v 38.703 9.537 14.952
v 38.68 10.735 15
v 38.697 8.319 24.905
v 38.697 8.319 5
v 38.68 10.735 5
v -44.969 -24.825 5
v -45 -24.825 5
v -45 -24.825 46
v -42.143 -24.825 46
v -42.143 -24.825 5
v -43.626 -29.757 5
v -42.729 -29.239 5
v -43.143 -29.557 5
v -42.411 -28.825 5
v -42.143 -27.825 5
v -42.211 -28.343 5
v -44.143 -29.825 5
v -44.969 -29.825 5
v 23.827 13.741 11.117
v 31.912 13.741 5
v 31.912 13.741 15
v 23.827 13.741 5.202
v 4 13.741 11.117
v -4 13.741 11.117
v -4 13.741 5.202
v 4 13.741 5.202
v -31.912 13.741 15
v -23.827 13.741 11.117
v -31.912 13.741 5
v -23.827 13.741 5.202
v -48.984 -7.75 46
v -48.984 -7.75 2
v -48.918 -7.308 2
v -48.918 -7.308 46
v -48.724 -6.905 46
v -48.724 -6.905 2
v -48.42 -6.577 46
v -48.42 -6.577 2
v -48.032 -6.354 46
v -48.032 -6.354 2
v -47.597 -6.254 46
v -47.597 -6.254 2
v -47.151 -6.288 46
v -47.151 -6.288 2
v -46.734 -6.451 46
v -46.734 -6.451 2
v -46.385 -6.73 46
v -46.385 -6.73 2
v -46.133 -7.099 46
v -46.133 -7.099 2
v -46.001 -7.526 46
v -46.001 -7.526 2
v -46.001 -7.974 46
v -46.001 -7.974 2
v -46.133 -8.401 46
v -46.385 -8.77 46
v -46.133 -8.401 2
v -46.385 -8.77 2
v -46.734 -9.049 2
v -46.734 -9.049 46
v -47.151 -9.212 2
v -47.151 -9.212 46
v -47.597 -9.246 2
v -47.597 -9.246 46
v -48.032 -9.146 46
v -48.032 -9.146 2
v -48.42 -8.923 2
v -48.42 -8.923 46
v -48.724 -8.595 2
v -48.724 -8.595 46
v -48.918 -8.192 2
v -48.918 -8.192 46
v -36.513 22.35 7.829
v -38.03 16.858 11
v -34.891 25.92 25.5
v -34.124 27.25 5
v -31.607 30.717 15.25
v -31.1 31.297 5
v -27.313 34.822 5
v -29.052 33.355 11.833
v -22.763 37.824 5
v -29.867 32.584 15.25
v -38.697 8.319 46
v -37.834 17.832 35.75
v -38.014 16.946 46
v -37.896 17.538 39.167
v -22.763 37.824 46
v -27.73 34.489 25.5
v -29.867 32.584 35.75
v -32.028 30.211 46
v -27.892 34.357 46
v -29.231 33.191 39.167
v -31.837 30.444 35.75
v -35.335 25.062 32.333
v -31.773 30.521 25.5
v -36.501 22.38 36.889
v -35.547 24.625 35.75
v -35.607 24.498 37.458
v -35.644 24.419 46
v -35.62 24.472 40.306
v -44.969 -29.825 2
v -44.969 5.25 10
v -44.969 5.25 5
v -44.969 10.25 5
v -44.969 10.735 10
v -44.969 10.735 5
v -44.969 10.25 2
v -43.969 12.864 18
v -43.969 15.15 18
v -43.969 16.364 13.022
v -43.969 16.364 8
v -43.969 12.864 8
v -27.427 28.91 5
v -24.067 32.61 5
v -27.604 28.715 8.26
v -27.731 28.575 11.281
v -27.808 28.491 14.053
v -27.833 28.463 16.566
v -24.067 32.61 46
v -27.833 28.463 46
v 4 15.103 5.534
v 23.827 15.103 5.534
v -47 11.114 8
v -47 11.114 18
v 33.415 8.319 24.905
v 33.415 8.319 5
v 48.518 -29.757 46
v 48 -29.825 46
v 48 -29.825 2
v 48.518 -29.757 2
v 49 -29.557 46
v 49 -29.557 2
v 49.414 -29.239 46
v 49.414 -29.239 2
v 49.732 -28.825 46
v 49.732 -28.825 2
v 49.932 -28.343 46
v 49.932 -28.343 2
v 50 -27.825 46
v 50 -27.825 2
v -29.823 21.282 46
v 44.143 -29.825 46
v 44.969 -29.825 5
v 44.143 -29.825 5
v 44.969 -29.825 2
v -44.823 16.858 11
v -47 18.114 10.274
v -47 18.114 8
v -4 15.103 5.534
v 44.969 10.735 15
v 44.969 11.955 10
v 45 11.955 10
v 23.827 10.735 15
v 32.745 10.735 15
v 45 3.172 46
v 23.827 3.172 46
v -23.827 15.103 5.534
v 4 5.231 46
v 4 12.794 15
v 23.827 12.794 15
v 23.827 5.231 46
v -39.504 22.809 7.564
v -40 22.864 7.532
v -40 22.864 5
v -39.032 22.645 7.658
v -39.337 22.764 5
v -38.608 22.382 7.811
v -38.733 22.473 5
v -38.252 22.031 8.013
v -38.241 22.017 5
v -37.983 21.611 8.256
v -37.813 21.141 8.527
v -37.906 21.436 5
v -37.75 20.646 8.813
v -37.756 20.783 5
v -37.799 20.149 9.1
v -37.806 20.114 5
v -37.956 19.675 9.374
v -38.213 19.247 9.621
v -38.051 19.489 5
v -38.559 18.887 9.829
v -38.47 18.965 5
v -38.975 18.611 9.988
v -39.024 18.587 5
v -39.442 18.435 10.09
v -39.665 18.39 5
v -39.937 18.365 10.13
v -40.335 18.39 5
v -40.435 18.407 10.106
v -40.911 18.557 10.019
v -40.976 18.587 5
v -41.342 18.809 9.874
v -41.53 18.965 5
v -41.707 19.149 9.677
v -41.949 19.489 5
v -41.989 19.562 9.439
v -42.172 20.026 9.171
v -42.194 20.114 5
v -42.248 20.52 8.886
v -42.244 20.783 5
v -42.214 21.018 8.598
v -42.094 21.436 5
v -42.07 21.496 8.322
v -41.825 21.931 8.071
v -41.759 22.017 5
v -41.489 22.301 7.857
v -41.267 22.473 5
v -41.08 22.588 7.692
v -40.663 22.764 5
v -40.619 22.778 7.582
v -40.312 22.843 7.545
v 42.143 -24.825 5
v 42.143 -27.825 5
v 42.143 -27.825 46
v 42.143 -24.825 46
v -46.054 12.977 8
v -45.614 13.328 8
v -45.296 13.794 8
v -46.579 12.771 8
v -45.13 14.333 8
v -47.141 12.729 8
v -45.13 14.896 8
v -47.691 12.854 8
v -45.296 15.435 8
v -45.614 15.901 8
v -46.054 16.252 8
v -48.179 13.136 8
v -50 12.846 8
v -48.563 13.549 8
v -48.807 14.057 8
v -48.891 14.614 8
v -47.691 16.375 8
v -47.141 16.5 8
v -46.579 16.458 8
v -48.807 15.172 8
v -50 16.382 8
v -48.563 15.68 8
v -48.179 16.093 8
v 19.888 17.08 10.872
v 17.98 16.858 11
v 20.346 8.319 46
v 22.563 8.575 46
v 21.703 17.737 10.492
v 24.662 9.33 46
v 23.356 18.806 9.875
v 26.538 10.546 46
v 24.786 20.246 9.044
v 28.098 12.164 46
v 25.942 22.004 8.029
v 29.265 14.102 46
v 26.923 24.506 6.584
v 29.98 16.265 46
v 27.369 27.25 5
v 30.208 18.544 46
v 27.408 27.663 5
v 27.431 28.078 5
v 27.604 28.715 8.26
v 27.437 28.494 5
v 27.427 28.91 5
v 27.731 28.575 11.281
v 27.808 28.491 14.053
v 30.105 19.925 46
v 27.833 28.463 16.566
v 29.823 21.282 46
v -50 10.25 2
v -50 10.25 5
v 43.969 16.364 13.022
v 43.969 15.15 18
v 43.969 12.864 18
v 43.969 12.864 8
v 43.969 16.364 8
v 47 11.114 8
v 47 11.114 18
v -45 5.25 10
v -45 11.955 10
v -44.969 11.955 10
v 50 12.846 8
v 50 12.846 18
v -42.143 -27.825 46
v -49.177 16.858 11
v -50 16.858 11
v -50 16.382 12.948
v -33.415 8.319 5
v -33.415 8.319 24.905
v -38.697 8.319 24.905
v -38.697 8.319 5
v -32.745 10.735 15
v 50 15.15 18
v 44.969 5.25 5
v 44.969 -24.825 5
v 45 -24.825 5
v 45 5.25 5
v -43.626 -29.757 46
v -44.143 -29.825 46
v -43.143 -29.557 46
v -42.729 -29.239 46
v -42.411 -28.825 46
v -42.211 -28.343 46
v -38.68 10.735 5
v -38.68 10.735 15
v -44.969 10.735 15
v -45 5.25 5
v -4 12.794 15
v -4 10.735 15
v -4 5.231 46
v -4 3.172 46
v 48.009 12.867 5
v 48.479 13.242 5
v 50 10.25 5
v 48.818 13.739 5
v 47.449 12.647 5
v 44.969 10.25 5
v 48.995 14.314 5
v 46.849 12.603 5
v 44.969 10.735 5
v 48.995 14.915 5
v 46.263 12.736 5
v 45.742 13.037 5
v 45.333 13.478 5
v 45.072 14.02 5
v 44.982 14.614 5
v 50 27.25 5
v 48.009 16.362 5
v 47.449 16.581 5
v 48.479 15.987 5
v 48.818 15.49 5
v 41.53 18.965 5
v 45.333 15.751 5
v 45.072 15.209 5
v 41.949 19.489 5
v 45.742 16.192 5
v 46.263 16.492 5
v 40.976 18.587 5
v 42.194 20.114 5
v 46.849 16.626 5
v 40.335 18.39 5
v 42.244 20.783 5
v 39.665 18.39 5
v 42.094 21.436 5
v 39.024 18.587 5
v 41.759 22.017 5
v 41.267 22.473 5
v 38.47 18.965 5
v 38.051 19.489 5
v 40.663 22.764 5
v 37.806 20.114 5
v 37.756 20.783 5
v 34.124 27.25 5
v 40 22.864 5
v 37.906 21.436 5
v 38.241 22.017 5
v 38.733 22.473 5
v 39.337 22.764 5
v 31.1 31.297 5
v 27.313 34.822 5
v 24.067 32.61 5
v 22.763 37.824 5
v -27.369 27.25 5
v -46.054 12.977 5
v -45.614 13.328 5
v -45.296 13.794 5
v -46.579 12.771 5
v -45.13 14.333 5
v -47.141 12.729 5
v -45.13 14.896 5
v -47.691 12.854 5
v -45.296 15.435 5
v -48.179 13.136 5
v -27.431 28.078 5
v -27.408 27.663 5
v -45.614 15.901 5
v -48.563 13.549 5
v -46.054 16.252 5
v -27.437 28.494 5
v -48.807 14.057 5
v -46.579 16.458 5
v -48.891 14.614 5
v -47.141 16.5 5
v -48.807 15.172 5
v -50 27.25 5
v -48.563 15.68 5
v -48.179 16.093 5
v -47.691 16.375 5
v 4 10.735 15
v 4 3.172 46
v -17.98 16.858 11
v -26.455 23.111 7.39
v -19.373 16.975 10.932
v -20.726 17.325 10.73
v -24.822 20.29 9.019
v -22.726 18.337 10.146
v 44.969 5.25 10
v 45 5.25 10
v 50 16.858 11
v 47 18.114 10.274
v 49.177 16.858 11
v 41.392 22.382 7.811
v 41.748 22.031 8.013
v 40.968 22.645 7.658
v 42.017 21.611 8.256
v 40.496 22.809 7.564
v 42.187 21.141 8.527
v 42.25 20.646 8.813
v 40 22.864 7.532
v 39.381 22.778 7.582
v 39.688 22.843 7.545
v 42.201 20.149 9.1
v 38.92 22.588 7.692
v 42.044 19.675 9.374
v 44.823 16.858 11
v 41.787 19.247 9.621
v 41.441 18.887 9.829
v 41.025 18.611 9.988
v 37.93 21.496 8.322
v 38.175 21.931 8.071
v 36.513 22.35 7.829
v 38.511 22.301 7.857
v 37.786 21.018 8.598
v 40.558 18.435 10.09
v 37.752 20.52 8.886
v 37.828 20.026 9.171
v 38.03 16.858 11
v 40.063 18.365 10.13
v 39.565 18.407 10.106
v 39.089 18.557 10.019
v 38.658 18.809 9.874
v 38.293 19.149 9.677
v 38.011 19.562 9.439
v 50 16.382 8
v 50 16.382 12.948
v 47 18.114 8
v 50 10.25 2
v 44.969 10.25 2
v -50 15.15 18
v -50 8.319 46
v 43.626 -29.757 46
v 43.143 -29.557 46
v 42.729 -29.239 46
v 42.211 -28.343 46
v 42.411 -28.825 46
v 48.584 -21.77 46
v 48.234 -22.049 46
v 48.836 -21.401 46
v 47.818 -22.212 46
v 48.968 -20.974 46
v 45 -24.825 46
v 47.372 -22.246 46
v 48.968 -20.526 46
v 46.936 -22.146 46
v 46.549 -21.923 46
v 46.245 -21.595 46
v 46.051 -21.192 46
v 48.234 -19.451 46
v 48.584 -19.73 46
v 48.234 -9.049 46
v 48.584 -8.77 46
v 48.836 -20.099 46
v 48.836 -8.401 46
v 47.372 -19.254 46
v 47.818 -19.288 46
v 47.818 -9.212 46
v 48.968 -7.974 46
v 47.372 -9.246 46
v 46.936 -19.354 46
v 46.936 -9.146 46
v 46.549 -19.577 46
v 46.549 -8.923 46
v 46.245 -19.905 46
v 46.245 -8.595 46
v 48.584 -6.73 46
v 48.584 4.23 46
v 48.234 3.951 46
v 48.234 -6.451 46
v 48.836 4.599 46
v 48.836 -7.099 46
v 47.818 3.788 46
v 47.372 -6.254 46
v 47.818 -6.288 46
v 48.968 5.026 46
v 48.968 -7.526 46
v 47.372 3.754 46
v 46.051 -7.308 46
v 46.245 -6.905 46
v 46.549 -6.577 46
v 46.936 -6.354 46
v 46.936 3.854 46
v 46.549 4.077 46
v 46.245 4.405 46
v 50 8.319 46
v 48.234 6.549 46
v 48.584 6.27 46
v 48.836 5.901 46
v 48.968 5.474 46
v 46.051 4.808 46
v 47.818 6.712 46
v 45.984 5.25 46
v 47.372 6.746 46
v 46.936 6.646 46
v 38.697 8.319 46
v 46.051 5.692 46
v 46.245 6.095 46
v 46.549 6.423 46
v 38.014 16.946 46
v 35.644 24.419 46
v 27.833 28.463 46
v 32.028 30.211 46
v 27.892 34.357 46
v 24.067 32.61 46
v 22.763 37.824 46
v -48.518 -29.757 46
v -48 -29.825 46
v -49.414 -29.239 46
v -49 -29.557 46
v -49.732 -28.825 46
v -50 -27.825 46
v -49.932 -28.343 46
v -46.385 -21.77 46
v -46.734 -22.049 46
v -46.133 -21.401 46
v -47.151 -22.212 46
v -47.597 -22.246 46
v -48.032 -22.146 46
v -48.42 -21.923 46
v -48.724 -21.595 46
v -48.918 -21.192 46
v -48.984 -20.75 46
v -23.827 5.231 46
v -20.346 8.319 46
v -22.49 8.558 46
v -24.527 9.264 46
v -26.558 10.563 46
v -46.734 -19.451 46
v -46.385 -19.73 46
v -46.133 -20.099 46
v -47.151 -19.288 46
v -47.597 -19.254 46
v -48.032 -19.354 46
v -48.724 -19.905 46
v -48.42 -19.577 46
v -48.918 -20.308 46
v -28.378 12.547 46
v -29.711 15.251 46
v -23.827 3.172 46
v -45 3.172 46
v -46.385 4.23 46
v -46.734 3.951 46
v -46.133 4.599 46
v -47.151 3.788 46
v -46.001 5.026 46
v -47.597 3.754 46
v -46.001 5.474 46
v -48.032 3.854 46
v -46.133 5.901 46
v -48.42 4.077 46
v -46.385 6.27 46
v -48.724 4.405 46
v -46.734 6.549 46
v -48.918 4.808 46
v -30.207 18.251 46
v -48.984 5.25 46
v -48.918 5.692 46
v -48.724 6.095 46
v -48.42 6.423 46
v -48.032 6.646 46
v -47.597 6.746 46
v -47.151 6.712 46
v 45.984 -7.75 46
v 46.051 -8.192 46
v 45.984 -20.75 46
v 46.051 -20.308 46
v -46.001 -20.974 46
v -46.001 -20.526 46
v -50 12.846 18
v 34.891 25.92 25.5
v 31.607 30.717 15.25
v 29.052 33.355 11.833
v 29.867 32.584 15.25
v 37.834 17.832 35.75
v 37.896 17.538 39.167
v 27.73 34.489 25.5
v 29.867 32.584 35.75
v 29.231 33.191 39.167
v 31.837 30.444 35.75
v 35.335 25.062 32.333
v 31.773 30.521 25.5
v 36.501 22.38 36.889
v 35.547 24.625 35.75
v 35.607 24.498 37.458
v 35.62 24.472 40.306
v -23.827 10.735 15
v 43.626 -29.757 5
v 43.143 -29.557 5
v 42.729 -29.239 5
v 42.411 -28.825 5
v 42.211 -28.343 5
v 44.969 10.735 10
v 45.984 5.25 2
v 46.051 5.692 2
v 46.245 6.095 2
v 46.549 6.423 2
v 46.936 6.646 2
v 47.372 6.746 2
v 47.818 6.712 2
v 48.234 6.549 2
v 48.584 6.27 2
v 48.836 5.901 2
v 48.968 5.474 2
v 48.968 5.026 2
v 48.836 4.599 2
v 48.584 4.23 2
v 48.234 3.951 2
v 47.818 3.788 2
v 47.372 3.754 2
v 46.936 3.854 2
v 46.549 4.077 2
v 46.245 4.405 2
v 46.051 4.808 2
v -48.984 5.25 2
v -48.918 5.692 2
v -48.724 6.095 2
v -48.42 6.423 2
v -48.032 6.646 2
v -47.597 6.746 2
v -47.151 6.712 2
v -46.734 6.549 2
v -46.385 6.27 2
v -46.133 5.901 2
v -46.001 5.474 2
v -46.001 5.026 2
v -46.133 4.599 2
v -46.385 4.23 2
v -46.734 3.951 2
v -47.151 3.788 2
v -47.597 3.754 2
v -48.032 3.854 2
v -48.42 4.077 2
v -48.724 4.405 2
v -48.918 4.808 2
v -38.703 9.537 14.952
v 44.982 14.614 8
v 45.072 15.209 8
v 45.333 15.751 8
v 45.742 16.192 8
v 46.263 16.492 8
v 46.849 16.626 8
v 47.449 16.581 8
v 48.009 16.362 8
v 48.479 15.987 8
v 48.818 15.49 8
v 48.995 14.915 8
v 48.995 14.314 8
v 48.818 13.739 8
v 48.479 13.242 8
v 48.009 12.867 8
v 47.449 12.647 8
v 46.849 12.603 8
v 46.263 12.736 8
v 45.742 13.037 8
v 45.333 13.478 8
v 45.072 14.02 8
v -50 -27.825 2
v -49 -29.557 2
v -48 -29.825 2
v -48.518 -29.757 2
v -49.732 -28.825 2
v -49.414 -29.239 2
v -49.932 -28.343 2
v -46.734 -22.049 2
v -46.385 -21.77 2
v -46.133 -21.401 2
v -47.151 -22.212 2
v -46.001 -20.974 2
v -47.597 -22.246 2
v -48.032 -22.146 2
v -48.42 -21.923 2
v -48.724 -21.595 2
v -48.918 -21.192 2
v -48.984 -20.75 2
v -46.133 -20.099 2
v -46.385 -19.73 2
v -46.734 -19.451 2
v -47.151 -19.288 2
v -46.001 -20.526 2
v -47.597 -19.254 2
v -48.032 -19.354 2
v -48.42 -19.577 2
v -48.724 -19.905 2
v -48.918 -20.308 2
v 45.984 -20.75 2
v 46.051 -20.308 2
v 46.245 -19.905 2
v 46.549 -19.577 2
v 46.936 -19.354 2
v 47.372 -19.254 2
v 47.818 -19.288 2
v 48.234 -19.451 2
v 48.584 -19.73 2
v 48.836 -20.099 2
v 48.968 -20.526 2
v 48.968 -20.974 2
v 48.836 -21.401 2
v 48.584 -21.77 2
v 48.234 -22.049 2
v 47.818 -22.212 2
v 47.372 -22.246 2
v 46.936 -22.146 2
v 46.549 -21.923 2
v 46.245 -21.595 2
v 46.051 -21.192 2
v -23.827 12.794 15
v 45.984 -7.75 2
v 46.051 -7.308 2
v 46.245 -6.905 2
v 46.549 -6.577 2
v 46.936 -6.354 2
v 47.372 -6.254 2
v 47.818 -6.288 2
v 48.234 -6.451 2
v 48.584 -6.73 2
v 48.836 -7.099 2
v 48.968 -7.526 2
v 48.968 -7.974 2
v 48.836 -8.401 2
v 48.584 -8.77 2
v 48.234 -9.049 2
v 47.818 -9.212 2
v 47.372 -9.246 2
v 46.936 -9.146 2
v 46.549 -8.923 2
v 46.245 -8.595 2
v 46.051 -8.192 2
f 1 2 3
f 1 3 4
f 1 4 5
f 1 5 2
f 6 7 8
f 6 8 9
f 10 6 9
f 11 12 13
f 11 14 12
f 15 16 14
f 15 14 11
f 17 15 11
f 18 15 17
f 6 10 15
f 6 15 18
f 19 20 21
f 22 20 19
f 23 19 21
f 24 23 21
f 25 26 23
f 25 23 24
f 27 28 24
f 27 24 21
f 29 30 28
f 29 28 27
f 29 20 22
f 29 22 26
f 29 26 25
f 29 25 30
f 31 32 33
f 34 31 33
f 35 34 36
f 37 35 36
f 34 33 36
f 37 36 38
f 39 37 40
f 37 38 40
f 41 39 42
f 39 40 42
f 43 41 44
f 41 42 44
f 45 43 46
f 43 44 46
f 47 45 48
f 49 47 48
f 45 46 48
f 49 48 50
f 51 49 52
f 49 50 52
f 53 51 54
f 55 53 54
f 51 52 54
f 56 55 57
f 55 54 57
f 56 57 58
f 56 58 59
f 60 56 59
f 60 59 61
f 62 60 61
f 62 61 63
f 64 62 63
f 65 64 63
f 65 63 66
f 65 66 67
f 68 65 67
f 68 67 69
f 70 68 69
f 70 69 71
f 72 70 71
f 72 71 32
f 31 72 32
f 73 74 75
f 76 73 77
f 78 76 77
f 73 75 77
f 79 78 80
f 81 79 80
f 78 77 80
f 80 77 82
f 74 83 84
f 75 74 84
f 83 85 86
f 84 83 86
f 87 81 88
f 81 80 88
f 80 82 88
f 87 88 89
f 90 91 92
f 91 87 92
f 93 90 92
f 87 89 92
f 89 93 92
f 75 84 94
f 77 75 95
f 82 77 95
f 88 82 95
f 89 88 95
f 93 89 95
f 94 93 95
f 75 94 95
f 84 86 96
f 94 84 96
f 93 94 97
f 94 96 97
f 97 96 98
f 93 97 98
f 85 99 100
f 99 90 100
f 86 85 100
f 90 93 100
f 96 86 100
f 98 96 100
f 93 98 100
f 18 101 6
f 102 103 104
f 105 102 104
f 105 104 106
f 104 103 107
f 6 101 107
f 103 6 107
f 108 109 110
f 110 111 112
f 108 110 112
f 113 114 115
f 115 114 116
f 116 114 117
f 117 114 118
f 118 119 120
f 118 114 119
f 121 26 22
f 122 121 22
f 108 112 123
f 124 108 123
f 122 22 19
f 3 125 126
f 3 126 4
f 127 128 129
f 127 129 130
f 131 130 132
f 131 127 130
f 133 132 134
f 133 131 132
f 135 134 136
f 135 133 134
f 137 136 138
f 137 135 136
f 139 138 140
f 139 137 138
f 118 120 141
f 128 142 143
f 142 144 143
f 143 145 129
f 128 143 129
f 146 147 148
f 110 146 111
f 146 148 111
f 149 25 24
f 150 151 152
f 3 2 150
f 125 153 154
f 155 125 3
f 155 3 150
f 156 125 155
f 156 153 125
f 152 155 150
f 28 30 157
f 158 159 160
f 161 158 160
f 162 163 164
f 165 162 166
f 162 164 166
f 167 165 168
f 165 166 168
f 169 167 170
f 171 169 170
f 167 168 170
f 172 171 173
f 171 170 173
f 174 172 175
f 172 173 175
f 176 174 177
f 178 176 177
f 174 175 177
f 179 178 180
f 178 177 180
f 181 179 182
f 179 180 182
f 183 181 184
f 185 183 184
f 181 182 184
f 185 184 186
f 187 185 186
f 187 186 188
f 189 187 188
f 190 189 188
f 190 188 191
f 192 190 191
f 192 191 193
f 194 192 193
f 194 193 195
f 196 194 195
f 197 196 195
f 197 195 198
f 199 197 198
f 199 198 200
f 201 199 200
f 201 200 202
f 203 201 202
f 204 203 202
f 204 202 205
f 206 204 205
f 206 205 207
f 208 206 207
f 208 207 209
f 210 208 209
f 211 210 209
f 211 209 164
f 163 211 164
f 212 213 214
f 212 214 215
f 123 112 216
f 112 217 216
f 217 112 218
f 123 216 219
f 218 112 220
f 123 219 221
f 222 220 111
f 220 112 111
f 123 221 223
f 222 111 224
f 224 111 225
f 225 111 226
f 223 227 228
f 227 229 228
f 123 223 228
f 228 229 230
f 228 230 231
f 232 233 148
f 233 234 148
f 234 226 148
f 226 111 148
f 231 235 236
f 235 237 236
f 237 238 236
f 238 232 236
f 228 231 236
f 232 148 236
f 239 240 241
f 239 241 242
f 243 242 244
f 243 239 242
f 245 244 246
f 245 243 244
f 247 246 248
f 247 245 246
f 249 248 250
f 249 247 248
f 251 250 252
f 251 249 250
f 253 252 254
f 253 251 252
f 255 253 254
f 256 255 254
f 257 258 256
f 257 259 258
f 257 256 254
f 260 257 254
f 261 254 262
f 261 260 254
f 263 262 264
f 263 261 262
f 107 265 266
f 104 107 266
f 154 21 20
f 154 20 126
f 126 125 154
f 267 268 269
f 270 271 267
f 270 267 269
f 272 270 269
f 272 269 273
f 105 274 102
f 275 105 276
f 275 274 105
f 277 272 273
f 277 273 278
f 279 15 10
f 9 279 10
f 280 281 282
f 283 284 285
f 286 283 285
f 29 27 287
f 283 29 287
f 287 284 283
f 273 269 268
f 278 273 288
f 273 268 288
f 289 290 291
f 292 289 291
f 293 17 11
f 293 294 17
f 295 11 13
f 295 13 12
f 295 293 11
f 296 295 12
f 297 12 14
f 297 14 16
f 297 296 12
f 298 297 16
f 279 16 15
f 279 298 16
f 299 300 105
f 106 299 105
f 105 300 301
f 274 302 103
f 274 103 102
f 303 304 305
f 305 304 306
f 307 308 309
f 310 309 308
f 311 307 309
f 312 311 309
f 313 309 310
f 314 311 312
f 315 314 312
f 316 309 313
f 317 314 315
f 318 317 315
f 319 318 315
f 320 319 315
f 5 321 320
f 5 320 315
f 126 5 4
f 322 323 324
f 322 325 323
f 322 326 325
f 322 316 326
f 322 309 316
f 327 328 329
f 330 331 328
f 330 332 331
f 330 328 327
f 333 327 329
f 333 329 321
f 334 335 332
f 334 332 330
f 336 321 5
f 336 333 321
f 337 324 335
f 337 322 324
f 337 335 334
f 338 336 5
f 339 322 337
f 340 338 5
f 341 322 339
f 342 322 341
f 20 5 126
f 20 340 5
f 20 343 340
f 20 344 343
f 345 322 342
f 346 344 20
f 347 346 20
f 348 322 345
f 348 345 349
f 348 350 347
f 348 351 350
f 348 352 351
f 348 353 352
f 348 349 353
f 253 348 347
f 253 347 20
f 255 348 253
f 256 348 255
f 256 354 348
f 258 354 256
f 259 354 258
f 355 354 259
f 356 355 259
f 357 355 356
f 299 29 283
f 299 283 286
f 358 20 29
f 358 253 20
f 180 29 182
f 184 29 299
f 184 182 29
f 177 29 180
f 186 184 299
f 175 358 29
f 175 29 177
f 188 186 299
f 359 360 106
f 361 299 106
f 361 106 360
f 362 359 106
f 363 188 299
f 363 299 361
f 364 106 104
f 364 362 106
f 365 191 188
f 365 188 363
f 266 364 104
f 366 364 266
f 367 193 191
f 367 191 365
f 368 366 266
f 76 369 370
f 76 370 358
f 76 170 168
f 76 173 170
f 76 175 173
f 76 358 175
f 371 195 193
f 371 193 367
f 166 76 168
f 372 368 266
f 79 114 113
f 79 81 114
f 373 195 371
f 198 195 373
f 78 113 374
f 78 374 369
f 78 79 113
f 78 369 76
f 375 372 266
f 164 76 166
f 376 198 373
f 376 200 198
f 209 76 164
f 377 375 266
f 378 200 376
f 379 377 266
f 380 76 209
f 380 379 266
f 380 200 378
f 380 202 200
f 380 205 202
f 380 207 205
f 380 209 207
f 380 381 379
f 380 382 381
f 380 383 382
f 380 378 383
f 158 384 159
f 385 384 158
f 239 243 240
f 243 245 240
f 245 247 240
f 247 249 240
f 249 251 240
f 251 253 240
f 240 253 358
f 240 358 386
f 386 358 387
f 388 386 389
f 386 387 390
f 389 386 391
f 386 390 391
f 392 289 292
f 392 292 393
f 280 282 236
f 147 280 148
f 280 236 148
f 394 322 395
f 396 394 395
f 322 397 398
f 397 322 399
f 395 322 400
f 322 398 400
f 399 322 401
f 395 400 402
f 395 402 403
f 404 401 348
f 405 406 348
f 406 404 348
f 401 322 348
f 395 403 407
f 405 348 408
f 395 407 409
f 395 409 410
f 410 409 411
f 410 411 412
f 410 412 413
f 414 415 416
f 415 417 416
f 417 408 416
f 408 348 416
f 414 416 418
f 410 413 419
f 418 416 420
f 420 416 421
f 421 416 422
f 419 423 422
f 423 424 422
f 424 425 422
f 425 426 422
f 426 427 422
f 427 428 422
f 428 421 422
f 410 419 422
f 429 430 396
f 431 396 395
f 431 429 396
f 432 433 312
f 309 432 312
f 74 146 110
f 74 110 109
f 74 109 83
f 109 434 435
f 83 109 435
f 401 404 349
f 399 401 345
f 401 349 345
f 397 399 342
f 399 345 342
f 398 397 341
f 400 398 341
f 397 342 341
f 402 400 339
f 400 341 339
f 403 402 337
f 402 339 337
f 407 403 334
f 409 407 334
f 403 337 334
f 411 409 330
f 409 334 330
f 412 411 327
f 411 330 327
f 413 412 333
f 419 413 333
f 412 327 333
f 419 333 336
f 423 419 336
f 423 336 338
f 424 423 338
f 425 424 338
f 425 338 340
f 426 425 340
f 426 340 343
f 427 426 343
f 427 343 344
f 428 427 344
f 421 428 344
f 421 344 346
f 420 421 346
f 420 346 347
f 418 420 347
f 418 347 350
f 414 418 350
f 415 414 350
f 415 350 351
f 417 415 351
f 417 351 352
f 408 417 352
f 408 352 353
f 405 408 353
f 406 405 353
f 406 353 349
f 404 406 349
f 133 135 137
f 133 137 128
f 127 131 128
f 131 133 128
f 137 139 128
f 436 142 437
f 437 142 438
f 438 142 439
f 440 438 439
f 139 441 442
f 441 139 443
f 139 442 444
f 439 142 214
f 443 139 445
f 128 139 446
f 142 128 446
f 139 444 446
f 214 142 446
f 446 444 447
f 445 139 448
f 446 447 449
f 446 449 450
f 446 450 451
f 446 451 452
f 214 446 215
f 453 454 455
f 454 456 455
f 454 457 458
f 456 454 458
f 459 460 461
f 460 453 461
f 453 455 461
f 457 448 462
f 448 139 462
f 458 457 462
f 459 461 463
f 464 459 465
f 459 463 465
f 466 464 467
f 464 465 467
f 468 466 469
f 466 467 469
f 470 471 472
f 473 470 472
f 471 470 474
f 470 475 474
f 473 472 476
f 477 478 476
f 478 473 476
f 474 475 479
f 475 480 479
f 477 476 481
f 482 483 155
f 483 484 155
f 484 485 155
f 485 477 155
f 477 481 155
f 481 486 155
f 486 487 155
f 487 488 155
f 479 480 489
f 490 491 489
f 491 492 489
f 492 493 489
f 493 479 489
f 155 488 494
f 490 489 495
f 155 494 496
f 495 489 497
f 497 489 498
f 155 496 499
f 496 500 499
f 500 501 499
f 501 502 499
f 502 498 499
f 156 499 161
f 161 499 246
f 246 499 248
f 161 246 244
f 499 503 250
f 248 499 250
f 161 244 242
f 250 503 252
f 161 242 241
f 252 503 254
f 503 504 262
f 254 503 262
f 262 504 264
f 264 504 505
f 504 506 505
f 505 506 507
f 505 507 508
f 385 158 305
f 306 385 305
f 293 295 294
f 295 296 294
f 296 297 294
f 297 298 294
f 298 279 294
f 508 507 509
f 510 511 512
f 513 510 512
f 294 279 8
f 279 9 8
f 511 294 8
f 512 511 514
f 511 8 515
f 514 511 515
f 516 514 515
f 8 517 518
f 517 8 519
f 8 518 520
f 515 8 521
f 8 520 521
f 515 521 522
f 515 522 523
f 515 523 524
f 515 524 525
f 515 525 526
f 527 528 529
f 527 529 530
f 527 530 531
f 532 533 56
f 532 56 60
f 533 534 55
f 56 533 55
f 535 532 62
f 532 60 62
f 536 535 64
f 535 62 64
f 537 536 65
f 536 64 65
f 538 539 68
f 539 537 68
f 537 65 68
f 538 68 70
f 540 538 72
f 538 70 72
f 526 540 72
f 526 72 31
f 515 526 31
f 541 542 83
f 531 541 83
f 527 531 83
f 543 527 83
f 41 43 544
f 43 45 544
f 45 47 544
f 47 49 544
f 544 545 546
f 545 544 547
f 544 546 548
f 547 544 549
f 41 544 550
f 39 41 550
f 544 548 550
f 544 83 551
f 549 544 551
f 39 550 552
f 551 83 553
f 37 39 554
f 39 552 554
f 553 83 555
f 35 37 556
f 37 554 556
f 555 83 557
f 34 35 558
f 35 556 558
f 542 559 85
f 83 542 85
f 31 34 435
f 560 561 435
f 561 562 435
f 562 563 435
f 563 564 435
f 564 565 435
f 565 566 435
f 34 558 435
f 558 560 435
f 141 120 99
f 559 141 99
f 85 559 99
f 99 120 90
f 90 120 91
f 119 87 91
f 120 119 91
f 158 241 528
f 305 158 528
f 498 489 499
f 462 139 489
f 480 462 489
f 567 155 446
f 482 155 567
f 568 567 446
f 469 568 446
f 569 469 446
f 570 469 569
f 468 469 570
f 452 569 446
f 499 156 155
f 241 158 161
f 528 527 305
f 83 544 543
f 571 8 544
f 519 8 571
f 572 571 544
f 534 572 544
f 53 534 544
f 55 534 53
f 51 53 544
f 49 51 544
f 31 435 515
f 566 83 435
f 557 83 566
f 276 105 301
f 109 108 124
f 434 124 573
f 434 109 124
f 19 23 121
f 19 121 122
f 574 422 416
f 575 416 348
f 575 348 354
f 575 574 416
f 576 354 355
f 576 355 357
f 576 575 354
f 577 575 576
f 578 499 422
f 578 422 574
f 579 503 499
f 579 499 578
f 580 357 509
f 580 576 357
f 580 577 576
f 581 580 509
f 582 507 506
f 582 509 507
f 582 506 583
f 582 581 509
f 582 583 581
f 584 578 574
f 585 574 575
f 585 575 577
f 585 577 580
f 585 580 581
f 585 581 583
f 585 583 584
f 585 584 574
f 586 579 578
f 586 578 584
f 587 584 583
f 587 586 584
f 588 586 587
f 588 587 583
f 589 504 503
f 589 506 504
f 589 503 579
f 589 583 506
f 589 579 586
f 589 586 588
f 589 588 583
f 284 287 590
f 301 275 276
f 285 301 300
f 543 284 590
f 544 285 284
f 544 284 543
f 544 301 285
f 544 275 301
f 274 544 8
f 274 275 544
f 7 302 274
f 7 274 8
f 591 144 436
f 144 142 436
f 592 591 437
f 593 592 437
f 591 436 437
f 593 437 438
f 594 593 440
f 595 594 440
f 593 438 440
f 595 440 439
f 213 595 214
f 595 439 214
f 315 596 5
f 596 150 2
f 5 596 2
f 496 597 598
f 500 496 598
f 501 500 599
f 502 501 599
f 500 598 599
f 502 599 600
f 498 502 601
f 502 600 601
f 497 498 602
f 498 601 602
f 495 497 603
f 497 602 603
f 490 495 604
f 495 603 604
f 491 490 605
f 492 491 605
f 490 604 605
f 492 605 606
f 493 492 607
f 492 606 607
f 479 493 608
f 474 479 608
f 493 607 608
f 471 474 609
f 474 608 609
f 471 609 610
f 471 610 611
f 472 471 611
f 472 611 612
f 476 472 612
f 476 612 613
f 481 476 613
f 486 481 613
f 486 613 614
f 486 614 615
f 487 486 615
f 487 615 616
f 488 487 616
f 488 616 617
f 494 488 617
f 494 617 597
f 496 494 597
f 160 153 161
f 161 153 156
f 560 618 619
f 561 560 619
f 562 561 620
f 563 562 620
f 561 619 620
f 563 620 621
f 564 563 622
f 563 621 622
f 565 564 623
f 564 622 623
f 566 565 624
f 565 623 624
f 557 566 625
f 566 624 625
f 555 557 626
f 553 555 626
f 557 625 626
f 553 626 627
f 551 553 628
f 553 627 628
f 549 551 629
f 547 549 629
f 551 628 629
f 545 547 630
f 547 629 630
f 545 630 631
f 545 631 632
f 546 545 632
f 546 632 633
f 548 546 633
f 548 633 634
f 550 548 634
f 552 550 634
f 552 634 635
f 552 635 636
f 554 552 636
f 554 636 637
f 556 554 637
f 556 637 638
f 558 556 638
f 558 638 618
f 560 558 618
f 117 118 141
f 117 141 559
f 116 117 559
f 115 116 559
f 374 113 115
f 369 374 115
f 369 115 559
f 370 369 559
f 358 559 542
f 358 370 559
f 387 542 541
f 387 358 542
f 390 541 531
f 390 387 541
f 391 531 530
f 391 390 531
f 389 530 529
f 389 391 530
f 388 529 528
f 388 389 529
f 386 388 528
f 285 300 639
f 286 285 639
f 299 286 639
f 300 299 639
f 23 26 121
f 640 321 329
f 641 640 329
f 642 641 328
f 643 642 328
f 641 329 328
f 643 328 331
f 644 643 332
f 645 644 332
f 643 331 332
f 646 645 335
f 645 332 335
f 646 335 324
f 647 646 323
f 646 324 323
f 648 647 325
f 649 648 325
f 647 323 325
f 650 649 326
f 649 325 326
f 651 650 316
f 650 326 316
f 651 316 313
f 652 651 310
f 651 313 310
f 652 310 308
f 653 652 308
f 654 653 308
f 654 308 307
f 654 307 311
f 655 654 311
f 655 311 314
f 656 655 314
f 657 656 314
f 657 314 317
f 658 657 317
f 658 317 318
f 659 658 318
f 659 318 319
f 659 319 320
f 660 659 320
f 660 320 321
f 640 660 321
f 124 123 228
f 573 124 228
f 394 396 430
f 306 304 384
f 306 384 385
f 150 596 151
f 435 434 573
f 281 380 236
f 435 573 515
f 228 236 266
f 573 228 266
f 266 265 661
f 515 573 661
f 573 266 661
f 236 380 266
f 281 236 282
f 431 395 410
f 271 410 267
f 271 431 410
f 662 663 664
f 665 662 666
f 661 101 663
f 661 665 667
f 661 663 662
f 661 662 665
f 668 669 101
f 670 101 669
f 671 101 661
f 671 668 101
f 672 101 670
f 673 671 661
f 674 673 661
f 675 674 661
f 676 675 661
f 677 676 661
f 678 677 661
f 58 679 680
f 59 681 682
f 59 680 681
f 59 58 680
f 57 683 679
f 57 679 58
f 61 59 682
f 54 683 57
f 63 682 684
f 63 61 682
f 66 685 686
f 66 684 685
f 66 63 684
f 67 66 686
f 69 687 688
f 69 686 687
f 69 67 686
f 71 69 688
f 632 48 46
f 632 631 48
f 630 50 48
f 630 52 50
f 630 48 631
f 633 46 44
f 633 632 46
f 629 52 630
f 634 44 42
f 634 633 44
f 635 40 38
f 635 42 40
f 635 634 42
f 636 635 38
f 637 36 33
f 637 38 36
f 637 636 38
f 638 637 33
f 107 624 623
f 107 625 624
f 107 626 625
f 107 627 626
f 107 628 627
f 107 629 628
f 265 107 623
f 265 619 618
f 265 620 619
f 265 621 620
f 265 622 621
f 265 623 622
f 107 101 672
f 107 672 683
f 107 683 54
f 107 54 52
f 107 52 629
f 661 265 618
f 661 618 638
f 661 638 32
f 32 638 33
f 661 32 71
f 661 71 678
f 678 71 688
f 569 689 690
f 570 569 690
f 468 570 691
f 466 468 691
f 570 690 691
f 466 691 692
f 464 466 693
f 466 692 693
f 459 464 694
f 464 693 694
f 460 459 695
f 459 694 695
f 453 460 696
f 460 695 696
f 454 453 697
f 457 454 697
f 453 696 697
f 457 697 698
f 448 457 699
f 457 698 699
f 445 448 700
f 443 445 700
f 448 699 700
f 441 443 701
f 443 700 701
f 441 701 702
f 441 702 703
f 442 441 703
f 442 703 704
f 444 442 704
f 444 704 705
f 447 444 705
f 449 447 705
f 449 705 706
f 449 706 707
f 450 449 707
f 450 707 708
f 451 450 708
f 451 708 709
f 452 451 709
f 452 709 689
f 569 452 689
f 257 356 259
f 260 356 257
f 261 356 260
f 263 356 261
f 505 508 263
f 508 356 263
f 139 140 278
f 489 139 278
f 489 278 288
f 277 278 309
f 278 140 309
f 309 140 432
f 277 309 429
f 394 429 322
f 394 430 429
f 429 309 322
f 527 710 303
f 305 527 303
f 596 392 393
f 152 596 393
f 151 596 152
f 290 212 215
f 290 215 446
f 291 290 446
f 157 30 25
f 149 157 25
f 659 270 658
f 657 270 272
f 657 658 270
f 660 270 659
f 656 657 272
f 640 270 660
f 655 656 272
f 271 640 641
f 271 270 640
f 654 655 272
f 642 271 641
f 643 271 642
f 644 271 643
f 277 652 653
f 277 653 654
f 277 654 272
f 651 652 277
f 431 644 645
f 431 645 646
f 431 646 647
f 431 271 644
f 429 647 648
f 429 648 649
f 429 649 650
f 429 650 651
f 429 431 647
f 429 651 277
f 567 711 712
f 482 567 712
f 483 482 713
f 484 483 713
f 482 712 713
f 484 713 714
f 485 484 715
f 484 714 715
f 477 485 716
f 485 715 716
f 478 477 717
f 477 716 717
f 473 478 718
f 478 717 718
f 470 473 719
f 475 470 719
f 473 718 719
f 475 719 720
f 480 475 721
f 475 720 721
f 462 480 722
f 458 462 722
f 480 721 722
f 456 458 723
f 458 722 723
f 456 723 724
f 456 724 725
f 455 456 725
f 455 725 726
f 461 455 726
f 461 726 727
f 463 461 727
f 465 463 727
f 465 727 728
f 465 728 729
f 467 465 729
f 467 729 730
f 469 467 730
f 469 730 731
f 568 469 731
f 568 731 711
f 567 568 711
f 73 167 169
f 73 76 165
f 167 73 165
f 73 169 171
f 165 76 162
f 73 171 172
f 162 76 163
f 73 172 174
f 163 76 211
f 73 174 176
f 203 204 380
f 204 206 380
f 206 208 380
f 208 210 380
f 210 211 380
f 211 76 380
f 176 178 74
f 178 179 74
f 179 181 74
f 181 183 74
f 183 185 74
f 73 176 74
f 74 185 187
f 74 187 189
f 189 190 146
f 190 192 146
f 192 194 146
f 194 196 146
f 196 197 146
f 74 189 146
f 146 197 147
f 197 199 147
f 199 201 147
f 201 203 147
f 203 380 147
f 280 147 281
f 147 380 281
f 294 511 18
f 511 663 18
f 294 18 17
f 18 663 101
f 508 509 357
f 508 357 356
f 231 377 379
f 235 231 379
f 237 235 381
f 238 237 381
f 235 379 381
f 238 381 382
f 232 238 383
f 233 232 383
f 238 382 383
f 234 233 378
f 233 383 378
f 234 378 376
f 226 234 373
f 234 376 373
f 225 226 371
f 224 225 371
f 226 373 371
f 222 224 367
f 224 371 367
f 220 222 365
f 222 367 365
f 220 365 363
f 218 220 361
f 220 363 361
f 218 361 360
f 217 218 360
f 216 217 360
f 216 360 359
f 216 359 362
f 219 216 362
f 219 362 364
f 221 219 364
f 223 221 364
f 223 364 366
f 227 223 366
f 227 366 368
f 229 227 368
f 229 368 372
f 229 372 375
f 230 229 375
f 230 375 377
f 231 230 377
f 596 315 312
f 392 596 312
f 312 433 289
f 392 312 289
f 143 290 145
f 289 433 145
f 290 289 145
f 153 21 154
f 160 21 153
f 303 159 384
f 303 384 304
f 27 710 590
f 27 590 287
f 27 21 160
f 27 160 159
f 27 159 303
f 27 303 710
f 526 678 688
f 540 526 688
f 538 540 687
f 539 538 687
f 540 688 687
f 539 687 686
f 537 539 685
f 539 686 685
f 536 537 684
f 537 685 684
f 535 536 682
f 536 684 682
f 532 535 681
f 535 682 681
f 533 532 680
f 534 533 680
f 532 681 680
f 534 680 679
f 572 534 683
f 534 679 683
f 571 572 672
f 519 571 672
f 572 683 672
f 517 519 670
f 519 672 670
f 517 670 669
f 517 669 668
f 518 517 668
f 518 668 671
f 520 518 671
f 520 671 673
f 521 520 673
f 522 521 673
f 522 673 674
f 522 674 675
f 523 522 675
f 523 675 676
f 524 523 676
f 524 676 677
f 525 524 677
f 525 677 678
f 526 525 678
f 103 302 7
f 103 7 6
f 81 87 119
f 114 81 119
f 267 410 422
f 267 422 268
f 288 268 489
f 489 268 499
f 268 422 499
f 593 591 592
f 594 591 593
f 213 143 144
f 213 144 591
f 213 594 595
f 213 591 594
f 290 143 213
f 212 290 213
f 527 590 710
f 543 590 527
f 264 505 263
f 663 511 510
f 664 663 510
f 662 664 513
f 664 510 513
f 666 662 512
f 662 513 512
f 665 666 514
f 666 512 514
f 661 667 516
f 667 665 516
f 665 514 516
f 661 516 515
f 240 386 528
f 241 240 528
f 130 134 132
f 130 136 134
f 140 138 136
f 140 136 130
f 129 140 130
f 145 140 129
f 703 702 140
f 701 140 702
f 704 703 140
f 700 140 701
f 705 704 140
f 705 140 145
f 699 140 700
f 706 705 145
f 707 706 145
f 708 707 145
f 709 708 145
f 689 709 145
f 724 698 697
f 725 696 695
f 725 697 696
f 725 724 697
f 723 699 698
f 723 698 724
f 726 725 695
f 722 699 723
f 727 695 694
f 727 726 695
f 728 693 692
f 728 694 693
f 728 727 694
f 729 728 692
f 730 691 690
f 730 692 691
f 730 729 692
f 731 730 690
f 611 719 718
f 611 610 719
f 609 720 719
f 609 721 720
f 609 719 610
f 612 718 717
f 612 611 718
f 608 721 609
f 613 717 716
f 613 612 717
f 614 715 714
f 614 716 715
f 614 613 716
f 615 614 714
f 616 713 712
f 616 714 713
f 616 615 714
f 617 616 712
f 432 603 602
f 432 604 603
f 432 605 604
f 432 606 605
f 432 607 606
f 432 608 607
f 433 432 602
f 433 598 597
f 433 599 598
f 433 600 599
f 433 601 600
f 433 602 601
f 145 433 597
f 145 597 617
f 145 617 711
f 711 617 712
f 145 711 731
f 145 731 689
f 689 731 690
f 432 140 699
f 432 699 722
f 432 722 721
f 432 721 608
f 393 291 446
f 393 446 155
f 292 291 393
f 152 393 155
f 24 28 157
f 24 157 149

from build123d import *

# Parameters (mm, degrees)
SALIENTE_EXTRUIR1_DEPTH = 46
CROQUIS3_W              = 5
CROQUIS3_H              = 17
CORTAR_EXTRUIR1_DEPTH   = 107
VACIADO1_T              = -5
CORTAR_EXTRUIR3_DEPTH   = 5
CROQUIS8_W              = 84.286700134
CROQUIS8_H              = 59.012293191
CORTAR_EXTRUIR6_DEPTH   = 50
CROQUIS9_W              = 89.93795334
CROQUIS9_H              = 8.49113686
CORTAR_EXTRUIR7_DEPTH   = 10
REDONDEO1_R             = 2
REDONDEO2_R             = 2
REDONDEO3_R             = 2
CROQUIS10_W             = 19.827227688
CROQUIS10_H             = 42.140696998
CORTAR_EXTRUIR8_DEPTH   = 2
CROQUIS11_R             = 2.017504942
CROQUIS11_R_2           = 1.891140859
CORTAR_EXTRUIR9_DEPTH   = 9
CROQUIS12_R             = 2.25
CORTAR_EXTRUIR10_DEPTH  = 33
CORTAR_EXTRUIR11_START  = -3
CROQUIS13_R             = 2.075
CORTAR_EXTRUIR11_DEPTH  = 7
CROQUIS15_W             = 7.96749323
CROQUIS15_H             = 3.005999516
SALIENTE_EXTRUIR2_DEPTH = 10
CROQUIS16_R             = 1.5
CORTAR_EXTRUIR13_DEPTH  = 73
CROQUIS17_W             = 124.159046256
CROQUIS17_H             = 73.830112024
CORTAR_EXTRUIR14_DEPTH  = 2
CORTAR_EXTRUIR15_DEPTH  = 10
SALIENTE_EXTRUIR3_DEPTH = 41
REDONDEO4_R             = 10


with BuildPart() as part:
    # Croquis1 → Saliente-Extruir1 (new body)
    with BuildSketch(Plane.XY):
        Polygon((-50, -27.25), (-50, -29.825247619), (50, -29.825247619), (50, -27.25), (50, 27.25), (-50, 27.25), align=None)
    extrude(amount=SALIENTE_EXTRUIR1_DEPTH)

    # Croquis3 → Cortar-Extruir1 (cut)
    with BuildSketch(Plane.ZY.offset(50)):
        Polygon((46, 27.25), (5, 27.25), (11, 16.857695155), (46, 8.318575661), align=None)
        with Locations((2.5, 18.75)):
            Rectangle(CROQUIS3_W, CROQUIS3_H)
    extrude(amount=-CORTAR_EXTRUIR1_DEPTH, mode=Mode.SUBTRACT)

    # Vaciado1
    vaciado1_openings = [part.faces().sort_by_distance(p)[0] for p in [
        (0, -10.753335979, 46),
    ]]
    offset(amount=VACIADO1_T, openings=vaciado1_openings, kind=Kind.INTERSECTION)

    # Croquis5 → Cortar-Extruir3 (cut)
    with BuildSketch(Plane(origin=(0, 0, 0), x_dir=(-1, 0, 0), z_dir=(0, 0, -1))):
        Polygon((-44.96897667, 22.941518711), (-44.96897667, -22.941518711), (-44.96897667, -34.965963837), (44.96897667, -34.965963837), (44.96897667, -22.941518711), (44.96897667, 22.941518711), align=None)
    extrude(amount=-CORTAR_EXTRUIR3_DEPTH, mode=Mode.SUBTRACT)

    # Croquis8 → Cortar-Extruir6 (cut)
    with BuildSketch(Plane(origin=(0, 0, 2), x_dir=(-1, 0, 0), z_dir=(0, 0, -1))):
        with Locations((0, -42.853406707)):
            Rectangle(CROQUIS8_W, CROQUIS8_H)
    extrude(amount=-CORTAR_EXTRUIR6_DEPTH, mode=Mode.SUBTRACT)

    # Croquis9 → Cortar-Extruir7 (cut)
    with BuildSketch(Plane(origin=(0, 0, 5), x_dir=(-1, 0, 0), z_dir=(0, 0, -1))):
        with Locations((0, 9.49556843)):
            Rectangle(CROQUIS9_W, CROQUIS9_H)
    extrude(amount=-CORTAR_EXTRUIR7_DEPTH, mode=Mode.SUBTRACT)

    # Redondeo1
    redondeo1_edges = [part.edges().sort_by_distance(p)[0] for p in [
        (42.143350067, -29.825247619, 25.5),
        (-50, -29.825247619, 23),
    ]]
    fillet(redondeo1_edges, radius=REDONDEO1_R)

    # Redondeo2
    redondeo2_edges = [part.edges().sort_by_distance(p)[0] for p in [
        (50, -29.825247619, 23),
    ]]
    fillet(redondeo2_edges, radius=REDONDEO2_R)

    # Redondeo3
    redondeo3_edges = [part.edges().sort_by_distance(p)[0] for p in [
        (-42.143350067, -29.825247619, 25.5),
    ]]
    fillet(redondeo3_edges, radius=REDONDEO3_R)

    # Croquis10 → Cortar-Extruir8 (cut)
    with BuildSketch(Plane(origin=(0, 13.586066701, 3.314658486), x_dir=(1, 0, 0), z_dir=(0, -0.9715041436001179, -0.237022570587279))):
        with Locations((13.913613844, 22.867026133)):
            Rectangle(CROQUIS10_W, CROQUIS10_H)
        with Locations((-13.913613844, 22.867026133)):
            Rectangle(CROQUIS10_W, CROQUIS10_H)
    extrude(amount=-CORTAR_EXTRUIR8_DEPTH, mode=Mode.SUBTRACT)

    # Croquis11 → Cortar-Extruir9 (cut)
    with BuildSketch(Plane(origin=(0, 0, 0), x_dir=(-1, 0, 0), z_dir=(0, 0, -1))):
        with Locations((-47, 14.614370501)):
            Circle(CROQUIS11_R)
        with Locations((47, 14.614370501)):
            Circle(CROQUIS11_R_2)
    extrude(amount=-CORTAR_EXTRUIR9_DEPTH, mode=Mode.SUBTRACT)

    # Croquis12 → Cortar-Extruir10 (cut)
    with BuildSketch(Plane(origin=(0, 0, 0), x_dir=(-1, 0, 0), z_dir=(0, 0, -1))):
        with Locations((40, 20.614370501)):
            Circle(CROQUIS12_R)
        with Locations((-40, 20.614370501)):
            Circle(CROQUIS12_R)
    extrude(amount=-CORTAR_EXTRUIR10_DEPTH, mode=Mode.SUBTRACT)

    # Croquis13 → Cortar-Extruir11 (cut)
    with BuildSketch(Plane(origin=(0, 0, 5), x_dir=(-1, 0, 0), z_dir=(0, 0, -1)).offset(CORTAR_EXTRUIR11_START)):
        with Locations((47, 14.614370501)):
            Circle(CROQUIS13_R)
        with Locations((-47, 14.614370501)):
            Circle(CROQUIS13_R)
    extrude(amount=-CORTAR_EXTRUIR11_DEPTH, mode=Mode.SUBTRACT)

    # Croquis15 → Saliente-Extruir2 (add)
    with BuildSketch(Plane(origin=(0, 0, 15), x_dir=(-1, 0, 0), z_dir=(0, 0, -1))):
        with Locations((-40.985230055, 12.238137102)):
            Rectangle(CROQUIS15_W, CROQUIS15_H)
        with Locations((40.985230055, 12.238137102)):
            Rectangle(CROQUIS15_W, CROQUIS15_H)
    extrude(amount=SALIENTE_EXTRUIR2_DEPTH)

    # Croquis16 → Cortar-Extruir13 (cut)
    with BuildSketch(Plane(origin=(0, 0, 0), x_dir=(-1, 0, 0), z_dir=(0, 0, -1))):
        with Locations((-47.484488335, 5.25)):
            Circle(CROQUIS16_R)
        with Locations((-47.484488335, -20.75)):
            Circle(CROQUIS16_R)
        with Locations((-47.484488335, -7.75)):
            Circle(CROQUIS16_R)
        with Locations((47.484488335, -7.75)):
            Circle(CROQUIS16_R)
        with Locations((47.484488335, -20.75)):
            Circle(CROQUIS16_R)
        with Locations((47.484488335, 5.25)):
            Circle(CROQUIS16_R)
    extrude(amount=-CORTAR_EXTRUIR13_DEPTH, mode=Mode.SUBTRACT)

    # Croquis17 → Cortar-Extruir14 (cut)
    with BuildSketch(Plane(origin=(0, 0, 0), x_dir=(-1, 0, 0), z_dir=(0, 0, -1))):
        Rectangle(CROQUIS17_W, CROQUIS17_H)
    extrude(amount=-CORTAR_EXTRUIR14_DEPTH, mode=Mode.SUBTRACT)

    # Croquis19 → Cortar-Extruir15 (cut)
    with BuildSketch(Plane.XY.offset(8)):
        Polygon((47, 11.114370501), (50.031088913, 12.864370501), (50.031088913, 16.364370501), (47, 18.114370501), (43.968911087, 16.364370501), (43.968911087, 12.864370501), align=None)
        Polygon((-43.968911087, 12.864370501), (-47, 11.114370501), (-50.031088913, 12.864370501), (-50.031088913, 16.364370501), (-47, 18.114370501), (-43.968911087, 16.364370501), align=None)
    extrude(amount=CORTAR_EXTRUIR15_DEPTH, mode=Mode.SUBTRACT)

    # Croquis21 → Saliente-Extruir3 (add)
    with BuildSketch(Plane.XY.offset(46)):
        with BuildLine():
            Line((-22.763380433, 37.82435205), (-24.067061415, 32.609628124))
            Line((-24.067061415, 32.609628124), (-27.833250917, 28.463205933))
            Line((-27.833250917, 28.463205933), (-33.41481635, 8.318575661))
            Line((-33.41481635, 8.318575661), (-38.697259097, 8.318575661))
            add(Edge.make_bspline(
                [(-38.697259097, 8.318575661), (-39.050795871, 28.768789272), (-22.763380433, 37.82435205)],
                knots=[0, 0, 0, 1, 1, 1], degree=2))
        make_face()
        with BuildLine():
            Line((27.833250917, 28.463205933), (33.41481635, 8.318575661))
            Line((33.41481635, 8.318575661), (38.697259097, 8.318575661))
            add(Edge.make_bspline(
                [(38.697259097, 8.318575661), (39.050795871, 28.768789272), (22.763380433, 37.82435205)],
                knots=[0, 0, 0, 1, 1, 1], degree=2))
            Line((22.763380433, 37.82435205), (24.067061415, 32.609628124))
            Line((24.067061415, 32.609628124), (27.833250917, 28.463205933))
        make_face()
    extrude(amount=-SALIENTE_EXTRUIR3_DEPTH)

    # Redondeo4
    redondeo4_edges = [part.edges().sort_by_distance(p)[0] for p in [
        (-32.231829779, 12.588135408, 28.5),
        (32.231829779, 12.588135408, 28.5),
    ]]
    fillet(redondeo4_edges, radius=REDONDEO4_R)


solid = part.part
